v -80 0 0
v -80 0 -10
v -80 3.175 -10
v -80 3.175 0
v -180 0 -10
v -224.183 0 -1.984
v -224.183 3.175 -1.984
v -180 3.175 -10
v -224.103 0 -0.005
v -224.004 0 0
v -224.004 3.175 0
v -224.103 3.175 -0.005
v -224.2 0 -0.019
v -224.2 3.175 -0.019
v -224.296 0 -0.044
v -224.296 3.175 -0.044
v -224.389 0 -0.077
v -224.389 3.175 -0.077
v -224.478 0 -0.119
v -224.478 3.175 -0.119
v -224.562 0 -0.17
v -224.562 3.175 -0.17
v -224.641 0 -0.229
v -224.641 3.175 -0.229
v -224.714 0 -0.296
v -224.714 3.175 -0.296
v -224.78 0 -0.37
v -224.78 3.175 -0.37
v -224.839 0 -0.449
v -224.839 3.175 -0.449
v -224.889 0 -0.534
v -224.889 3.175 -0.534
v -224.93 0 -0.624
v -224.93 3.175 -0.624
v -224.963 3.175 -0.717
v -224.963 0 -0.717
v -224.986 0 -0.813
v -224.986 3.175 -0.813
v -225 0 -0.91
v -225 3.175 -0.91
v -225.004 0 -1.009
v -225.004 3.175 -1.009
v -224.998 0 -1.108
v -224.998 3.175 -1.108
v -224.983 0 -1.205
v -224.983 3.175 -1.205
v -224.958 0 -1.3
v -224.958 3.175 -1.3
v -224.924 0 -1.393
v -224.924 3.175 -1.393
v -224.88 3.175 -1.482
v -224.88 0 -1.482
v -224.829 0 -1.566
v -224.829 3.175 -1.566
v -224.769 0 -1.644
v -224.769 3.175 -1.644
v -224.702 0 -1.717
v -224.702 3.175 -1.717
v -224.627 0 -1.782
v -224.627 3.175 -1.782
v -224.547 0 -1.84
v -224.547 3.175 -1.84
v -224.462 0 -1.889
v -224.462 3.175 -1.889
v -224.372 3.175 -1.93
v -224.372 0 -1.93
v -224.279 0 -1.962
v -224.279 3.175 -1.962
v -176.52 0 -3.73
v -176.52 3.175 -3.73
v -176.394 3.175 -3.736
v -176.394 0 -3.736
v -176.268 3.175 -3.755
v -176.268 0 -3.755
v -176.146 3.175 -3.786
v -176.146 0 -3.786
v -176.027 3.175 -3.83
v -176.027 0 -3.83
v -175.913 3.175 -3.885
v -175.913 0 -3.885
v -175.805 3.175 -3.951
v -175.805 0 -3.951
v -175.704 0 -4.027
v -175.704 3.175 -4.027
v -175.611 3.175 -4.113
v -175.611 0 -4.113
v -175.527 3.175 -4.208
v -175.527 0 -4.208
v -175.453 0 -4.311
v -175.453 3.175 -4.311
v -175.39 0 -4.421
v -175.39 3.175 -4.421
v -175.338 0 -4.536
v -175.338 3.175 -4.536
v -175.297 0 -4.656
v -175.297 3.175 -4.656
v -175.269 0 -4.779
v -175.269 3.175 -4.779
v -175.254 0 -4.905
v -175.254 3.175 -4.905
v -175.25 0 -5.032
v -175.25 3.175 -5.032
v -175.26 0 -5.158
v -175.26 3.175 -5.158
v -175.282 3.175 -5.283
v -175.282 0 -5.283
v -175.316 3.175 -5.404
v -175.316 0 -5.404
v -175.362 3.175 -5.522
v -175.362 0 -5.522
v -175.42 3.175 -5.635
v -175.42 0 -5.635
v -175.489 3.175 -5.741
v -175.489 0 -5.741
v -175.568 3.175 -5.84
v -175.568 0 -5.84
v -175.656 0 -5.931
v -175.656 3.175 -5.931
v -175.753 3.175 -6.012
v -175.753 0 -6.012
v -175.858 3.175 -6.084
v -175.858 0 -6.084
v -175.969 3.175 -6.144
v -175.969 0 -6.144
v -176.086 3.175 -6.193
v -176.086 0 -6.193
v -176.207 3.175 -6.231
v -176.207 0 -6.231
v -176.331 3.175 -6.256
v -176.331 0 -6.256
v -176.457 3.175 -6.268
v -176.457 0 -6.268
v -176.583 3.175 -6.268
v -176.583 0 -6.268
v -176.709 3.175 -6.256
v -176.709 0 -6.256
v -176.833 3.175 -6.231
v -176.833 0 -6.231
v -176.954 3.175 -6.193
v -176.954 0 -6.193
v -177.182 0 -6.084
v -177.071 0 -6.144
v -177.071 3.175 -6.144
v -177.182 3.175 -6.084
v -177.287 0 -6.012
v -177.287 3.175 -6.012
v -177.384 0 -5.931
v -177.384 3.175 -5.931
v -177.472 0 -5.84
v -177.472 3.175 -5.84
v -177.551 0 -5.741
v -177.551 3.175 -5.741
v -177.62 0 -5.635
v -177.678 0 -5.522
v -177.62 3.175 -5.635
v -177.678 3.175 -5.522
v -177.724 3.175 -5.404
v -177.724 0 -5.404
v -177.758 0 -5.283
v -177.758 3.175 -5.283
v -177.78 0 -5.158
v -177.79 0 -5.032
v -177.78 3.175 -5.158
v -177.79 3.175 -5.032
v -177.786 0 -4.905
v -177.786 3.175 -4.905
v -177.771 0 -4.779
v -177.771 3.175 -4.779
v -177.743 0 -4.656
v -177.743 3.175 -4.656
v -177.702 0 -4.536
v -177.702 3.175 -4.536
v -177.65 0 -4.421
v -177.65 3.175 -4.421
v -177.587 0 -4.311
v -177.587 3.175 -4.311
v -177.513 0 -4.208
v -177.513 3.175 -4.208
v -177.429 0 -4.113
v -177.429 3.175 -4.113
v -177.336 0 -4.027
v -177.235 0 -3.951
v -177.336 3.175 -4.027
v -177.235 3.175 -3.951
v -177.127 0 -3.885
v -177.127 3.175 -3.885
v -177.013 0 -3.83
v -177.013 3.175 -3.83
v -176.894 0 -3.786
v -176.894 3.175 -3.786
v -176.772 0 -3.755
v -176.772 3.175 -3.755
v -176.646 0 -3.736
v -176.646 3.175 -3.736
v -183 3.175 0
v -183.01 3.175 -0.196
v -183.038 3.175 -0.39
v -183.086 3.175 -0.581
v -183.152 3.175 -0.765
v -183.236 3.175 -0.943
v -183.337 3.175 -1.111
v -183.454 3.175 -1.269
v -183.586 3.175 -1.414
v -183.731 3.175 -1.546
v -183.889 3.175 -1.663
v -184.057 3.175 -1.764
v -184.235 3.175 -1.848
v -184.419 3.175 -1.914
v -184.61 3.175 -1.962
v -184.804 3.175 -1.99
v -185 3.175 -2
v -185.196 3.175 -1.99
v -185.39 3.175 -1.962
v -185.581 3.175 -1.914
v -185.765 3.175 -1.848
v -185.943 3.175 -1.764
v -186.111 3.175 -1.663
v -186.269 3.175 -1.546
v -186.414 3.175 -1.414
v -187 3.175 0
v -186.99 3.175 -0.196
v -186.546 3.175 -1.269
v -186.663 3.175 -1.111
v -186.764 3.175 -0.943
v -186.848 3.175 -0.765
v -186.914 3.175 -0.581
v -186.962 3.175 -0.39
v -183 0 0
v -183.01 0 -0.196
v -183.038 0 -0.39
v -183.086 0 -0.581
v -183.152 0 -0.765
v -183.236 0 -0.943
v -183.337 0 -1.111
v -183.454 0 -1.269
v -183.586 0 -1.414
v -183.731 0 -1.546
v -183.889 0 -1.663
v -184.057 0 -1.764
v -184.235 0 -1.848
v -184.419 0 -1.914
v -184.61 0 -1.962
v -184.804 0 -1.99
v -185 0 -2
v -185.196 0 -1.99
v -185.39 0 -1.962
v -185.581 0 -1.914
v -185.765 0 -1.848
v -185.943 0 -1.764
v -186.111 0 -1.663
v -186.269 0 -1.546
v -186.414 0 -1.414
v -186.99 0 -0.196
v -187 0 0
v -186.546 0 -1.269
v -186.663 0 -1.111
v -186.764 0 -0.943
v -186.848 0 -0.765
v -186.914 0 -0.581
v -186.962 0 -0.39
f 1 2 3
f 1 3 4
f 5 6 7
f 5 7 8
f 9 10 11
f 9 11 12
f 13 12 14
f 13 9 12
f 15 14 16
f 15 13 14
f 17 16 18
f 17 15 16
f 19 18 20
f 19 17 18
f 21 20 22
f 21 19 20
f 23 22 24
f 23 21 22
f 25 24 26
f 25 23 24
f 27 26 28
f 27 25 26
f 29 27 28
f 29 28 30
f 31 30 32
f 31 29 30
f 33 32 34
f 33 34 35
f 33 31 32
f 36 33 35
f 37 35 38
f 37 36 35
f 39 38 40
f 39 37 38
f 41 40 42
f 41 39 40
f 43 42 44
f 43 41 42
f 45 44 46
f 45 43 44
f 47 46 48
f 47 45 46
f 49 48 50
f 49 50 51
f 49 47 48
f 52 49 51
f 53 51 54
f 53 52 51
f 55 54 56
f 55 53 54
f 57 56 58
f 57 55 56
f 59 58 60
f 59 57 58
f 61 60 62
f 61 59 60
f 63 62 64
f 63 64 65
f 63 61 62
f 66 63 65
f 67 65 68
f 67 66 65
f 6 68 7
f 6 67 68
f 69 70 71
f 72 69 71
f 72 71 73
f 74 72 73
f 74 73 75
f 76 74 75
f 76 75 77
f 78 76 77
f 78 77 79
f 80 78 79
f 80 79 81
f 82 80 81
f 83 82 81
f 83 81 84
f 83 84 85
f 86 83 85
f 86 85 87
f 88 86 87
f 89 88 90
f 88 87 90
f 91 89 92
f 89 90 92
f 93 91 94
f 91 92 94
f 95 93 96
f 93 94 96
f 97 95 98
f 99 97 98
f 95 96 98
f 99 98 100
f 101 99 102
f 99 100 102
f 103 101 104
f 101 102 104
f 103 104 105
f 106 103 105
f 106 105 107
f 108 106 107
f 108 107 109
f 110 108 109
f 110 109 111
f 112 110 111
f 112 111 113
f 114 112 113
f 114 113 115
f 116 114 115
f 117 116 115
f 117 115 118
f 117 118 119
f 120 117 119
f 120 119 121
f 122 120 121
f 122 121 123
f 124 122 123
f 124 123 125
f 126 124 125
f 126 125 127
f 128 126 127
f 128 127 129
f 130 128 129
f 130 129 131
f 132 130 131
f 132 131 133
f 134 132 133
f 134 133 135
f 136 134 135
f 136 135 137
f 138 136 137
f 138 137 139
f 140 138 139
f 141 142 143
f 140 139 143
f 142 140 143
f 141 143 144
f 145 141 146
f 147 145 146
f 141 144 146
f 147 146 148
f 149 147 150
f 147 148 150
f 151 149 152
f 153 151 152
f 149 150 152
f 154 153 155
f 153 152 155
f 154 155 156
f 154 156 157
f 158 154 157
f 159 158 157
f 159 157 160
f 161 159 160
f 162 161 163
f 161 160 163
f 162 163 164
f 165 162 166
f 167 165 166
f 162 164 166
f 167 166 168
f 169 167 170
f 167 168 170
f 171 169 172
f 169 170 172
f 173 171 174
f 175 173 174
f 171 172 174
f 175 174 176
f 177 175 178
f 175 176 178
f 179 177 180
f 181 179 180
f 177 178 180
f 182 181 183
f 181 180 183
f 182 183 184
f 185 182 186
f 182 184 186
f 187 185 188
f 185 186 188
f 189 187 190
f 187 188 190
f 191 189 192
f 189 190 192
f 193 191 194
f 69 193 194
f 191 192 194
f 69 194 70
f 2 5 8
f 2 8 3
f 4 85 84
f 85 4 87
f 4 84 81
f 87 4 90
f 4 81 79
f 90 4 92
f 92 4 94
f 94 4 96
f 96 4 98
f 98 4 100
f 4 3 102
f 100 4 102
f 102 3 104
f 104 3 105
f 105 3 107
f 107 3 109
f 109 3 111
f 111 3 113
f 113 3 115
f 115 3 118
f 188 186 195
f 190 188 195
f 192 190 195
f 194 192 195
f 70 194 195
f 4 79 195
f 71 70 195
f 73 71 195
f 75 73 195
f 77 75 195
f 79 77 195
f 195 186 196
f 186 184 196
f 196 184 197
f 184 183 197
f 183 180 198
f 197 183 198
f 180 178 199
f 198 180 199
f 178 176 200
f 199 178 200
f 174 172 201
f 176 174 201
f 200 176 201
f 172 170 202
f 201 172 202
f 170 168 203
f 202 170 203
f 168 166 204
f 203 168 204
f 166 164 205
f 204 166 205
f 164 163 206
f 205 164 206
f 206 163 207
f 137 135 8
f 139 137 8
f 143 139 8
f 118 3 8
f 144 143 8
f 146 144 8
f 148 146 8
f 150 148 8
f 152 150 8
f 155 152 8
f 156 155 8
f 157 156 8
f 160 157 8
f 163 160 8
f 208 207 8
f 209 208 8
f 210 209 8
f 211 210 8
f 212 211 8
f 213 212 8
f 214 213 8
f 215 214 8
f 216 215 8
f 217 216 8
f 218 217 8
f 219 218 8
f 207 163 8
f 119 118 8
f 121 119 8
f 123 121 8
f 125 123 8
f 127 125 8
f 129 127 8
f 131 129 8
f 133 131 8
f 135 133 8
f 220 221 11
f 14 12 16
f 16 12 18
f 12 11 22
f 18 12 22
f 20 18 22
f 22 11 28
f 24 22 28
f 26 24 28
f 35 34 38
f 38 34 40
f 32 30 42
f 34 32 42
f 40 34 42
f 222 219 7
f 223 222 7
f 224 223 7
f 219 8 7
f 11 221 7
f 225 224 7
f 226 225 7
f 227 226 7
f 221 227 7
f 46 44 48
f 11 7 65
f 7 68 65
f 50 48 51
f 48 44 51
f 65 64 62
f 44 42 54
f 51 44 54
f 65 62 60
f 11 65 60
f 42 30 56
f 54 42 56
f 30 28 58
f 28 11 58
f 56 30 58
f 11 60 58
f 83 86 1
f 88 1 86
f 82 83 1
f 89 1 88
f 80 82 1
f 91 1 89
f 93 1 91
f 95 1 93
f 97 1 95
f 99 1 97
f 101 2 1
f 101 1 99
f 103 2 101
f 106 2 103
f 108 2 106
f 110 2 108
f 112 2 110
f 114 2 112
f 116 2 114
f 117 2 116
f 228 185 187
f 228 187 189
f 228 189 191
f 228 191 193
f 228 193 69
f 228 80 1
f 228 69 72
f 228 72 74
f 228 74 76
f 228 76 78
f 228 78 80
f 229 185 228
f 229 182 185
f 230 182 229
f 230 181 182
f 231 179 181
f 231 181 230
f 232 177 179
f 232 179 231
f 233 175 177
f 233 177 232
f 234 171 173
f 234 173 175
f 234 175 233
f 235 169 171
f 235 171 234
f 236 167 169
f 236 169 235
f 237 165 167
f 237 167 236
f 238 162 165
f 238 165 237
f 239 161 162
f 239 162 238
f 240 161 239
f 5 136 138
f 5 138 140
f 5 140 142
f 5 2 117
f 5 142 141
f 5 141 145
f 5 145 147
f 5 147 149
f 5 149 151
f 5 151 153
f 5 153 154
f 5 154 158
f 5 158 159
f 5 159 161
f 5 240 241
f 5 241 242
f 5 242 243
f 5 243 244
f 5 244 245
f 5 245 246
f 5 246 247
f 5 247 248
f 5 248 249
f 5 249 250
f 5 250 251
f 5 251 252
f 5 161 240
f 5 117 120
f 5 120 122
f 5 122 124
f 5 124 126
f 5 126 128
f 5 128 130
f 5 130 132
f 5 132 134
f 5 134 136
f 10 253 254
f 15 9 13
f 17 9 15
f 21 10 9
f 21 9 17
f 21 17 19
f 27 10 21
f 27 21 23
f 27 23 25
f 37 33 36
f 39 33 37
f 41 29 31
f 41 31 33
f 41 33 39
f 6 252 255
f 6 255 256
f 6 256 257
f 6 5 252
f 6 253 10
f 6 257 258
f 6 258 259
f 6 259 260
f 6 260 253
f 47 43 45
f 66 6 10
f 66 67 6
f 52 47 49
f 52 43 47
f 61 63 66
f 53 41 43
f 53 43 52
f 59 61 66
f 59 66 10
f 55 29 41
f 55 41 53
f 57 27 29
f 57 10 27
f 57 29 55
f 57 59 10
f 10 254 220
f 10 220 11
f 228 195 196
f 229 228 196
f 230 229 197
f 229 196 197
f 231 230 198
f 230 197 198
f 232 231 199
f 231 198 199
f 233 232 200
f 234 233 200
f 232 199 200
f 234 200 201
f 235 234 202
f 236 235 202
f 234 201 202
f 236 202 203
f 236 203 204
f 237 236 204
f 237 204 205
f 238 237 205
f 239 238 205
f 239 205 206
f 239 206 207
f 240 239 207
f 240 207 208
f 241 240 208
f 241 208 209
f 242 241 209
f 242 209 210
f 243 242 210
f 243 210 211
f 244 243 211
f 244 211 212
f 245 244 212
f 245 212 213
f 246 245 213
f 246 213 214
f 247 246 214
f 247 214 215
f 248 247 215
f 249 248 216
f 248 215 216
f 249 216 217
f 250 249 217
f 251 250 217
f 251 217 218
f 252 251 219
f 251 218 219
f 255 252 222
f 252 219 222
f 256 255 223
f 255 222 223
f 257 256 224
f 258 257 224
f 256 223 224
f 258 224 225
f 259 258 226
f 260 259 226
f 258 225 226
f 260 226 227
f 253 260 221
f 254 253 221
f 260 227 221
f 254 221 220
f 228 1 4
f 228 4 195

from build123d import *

# Parameters (mm, degrees)
BOSS_EXTRUDE1_DEPTH = 3.175
CUT_EXTRUDE1_REACH  = 227.249
SKETCH2_R           = 1.27
CUT_EXTRUDE2_DEPTH  = 226.248510263
SKETCH4_W           = 85
SKETCH4_H           = 10
CUT_EXTRUDE3_DEPTH  = 226.248510263


with BuildPart() as part:
    # Sketch1 → Boss-Extrude1 (new body)
    with BuildSketch(Plane(origin=(0, 0, 0), x_dir=(1, 0, 0), z_dir=(0, 1, 0))):
        with BuildLine():
            Line((0, 0), (-224.004023854, 0))
            ThreePointArc((-224.004023854, 0), (-225, 0.910381269), (-224.18254009, 1.983936966))
            Line((-224.18254009, 1.983936966), (-180, 10))
            Line((-180, 10), (0, 10))
            ThreePointArc((0, 10), (5, 5), (0, 0))
        make_face()
    extrude(amount=BOSS_EXTRUDE1_DEPTH)

    # Sketch2 → Cut-Extrude1 (cut, up to next)
    with BuildSketch(Plane(origin=(0, 3.175, 0), x_dir=(1, 0, 0), z_dir=(0, 1, 0)), mode=Mode.PRIVATE) as cut_extrude1_sk1:
        with Locations(Location((-50, 5, 0), (0, 0, 270))):
            Circle(SKETCH2_R)
    cut_extrude1_tool1 = extrude(cut_extrude1_sk1.sketch, amount=-CUT_EXTRUDE1_REACH, mode=Mode.PRIVATE) & part.part
    # Sketch2 → Cut-Extrude1 (cut, up to next)
    with BuildSketch(Plane(origin=(0, 3.175, 0), x_dir=(1, 0, 0), z_dir=(0, 1, 0)), mode=Mode.PRIVATE) as cut_extrude1_sk2:
        with Locations(Location((0, 5, 0), (0, 0, 270))):
            Circle(SKETCH2_R)
    cut_extrude1_tool2 = extrude(cut_extrude1_sk2.sketch, amount=-CUT_EXTRUDE1_REACH, mode=Mode.PRIVATE) & part.part
    # Sketch2 → Cut-Extrude1 (cut, up to next)
    with BuildSketch(Plane(origin=(0, 3.175, 0), x_dir=(1, 0, 0), z_dir=(0, 1, 0)), mode=Mode.PRIVATE) as cut_extrude1_sk3:
        with Locations(Location((-176.52, 5, 0), (0, 0, 270))):
            Circle(SKETCH2_R)
    cut_extrude1_tool3 = extrude(cut_extrude1_sk3.sketch, amount=-CUT_EXTRUDE1_REACH, mode=Mode.PRIVATE) & part.part
    add(cut_extrude1_tool1.solids().sort_by_distance((-50, 3.175, -5))[0], mode=Mode.SUBTRACT)
    add(cut_extrude1_tool2.solids().sort_by_distance((0, 3.175, -5))[0], mode=Mode.SUBTRACT)
    add(cut_extrude1_tool3.solids().sort_by_distance((-176.52, 3.175, -5))[0], mode=Mode.SUBTRACT)

    # Sketch3 → Cut-Extrude2 (cut, through all)
    with BuildSketch(Plane(origin=(0, 3.175, 0), x_dir=(1, 0, 0), z_dir=(0, 1, 0))):
        with BuildLine():
            Line((-187, 0), (-183, 0))
            ThreePointArc((-183, 0), (-185, 2), (-187, 0))
        make_face()
    extrude(amount=-CUT_EXTRUDE2_DEPTH, mode=Mode.SUBTRACT)

    # Sketch4 → Cut-Extrude3 (cut, through all)
    with BuildSketch(Plane.XZ):
        with Locations((-37.5, -5)):
            Rectangle(SKETCH4_W, SKETCH4_H)
    extrude(amount=-CUT_EXTRUDE3_DEPTH, mode=Mode.SUBTRACT)


solid = part.part
